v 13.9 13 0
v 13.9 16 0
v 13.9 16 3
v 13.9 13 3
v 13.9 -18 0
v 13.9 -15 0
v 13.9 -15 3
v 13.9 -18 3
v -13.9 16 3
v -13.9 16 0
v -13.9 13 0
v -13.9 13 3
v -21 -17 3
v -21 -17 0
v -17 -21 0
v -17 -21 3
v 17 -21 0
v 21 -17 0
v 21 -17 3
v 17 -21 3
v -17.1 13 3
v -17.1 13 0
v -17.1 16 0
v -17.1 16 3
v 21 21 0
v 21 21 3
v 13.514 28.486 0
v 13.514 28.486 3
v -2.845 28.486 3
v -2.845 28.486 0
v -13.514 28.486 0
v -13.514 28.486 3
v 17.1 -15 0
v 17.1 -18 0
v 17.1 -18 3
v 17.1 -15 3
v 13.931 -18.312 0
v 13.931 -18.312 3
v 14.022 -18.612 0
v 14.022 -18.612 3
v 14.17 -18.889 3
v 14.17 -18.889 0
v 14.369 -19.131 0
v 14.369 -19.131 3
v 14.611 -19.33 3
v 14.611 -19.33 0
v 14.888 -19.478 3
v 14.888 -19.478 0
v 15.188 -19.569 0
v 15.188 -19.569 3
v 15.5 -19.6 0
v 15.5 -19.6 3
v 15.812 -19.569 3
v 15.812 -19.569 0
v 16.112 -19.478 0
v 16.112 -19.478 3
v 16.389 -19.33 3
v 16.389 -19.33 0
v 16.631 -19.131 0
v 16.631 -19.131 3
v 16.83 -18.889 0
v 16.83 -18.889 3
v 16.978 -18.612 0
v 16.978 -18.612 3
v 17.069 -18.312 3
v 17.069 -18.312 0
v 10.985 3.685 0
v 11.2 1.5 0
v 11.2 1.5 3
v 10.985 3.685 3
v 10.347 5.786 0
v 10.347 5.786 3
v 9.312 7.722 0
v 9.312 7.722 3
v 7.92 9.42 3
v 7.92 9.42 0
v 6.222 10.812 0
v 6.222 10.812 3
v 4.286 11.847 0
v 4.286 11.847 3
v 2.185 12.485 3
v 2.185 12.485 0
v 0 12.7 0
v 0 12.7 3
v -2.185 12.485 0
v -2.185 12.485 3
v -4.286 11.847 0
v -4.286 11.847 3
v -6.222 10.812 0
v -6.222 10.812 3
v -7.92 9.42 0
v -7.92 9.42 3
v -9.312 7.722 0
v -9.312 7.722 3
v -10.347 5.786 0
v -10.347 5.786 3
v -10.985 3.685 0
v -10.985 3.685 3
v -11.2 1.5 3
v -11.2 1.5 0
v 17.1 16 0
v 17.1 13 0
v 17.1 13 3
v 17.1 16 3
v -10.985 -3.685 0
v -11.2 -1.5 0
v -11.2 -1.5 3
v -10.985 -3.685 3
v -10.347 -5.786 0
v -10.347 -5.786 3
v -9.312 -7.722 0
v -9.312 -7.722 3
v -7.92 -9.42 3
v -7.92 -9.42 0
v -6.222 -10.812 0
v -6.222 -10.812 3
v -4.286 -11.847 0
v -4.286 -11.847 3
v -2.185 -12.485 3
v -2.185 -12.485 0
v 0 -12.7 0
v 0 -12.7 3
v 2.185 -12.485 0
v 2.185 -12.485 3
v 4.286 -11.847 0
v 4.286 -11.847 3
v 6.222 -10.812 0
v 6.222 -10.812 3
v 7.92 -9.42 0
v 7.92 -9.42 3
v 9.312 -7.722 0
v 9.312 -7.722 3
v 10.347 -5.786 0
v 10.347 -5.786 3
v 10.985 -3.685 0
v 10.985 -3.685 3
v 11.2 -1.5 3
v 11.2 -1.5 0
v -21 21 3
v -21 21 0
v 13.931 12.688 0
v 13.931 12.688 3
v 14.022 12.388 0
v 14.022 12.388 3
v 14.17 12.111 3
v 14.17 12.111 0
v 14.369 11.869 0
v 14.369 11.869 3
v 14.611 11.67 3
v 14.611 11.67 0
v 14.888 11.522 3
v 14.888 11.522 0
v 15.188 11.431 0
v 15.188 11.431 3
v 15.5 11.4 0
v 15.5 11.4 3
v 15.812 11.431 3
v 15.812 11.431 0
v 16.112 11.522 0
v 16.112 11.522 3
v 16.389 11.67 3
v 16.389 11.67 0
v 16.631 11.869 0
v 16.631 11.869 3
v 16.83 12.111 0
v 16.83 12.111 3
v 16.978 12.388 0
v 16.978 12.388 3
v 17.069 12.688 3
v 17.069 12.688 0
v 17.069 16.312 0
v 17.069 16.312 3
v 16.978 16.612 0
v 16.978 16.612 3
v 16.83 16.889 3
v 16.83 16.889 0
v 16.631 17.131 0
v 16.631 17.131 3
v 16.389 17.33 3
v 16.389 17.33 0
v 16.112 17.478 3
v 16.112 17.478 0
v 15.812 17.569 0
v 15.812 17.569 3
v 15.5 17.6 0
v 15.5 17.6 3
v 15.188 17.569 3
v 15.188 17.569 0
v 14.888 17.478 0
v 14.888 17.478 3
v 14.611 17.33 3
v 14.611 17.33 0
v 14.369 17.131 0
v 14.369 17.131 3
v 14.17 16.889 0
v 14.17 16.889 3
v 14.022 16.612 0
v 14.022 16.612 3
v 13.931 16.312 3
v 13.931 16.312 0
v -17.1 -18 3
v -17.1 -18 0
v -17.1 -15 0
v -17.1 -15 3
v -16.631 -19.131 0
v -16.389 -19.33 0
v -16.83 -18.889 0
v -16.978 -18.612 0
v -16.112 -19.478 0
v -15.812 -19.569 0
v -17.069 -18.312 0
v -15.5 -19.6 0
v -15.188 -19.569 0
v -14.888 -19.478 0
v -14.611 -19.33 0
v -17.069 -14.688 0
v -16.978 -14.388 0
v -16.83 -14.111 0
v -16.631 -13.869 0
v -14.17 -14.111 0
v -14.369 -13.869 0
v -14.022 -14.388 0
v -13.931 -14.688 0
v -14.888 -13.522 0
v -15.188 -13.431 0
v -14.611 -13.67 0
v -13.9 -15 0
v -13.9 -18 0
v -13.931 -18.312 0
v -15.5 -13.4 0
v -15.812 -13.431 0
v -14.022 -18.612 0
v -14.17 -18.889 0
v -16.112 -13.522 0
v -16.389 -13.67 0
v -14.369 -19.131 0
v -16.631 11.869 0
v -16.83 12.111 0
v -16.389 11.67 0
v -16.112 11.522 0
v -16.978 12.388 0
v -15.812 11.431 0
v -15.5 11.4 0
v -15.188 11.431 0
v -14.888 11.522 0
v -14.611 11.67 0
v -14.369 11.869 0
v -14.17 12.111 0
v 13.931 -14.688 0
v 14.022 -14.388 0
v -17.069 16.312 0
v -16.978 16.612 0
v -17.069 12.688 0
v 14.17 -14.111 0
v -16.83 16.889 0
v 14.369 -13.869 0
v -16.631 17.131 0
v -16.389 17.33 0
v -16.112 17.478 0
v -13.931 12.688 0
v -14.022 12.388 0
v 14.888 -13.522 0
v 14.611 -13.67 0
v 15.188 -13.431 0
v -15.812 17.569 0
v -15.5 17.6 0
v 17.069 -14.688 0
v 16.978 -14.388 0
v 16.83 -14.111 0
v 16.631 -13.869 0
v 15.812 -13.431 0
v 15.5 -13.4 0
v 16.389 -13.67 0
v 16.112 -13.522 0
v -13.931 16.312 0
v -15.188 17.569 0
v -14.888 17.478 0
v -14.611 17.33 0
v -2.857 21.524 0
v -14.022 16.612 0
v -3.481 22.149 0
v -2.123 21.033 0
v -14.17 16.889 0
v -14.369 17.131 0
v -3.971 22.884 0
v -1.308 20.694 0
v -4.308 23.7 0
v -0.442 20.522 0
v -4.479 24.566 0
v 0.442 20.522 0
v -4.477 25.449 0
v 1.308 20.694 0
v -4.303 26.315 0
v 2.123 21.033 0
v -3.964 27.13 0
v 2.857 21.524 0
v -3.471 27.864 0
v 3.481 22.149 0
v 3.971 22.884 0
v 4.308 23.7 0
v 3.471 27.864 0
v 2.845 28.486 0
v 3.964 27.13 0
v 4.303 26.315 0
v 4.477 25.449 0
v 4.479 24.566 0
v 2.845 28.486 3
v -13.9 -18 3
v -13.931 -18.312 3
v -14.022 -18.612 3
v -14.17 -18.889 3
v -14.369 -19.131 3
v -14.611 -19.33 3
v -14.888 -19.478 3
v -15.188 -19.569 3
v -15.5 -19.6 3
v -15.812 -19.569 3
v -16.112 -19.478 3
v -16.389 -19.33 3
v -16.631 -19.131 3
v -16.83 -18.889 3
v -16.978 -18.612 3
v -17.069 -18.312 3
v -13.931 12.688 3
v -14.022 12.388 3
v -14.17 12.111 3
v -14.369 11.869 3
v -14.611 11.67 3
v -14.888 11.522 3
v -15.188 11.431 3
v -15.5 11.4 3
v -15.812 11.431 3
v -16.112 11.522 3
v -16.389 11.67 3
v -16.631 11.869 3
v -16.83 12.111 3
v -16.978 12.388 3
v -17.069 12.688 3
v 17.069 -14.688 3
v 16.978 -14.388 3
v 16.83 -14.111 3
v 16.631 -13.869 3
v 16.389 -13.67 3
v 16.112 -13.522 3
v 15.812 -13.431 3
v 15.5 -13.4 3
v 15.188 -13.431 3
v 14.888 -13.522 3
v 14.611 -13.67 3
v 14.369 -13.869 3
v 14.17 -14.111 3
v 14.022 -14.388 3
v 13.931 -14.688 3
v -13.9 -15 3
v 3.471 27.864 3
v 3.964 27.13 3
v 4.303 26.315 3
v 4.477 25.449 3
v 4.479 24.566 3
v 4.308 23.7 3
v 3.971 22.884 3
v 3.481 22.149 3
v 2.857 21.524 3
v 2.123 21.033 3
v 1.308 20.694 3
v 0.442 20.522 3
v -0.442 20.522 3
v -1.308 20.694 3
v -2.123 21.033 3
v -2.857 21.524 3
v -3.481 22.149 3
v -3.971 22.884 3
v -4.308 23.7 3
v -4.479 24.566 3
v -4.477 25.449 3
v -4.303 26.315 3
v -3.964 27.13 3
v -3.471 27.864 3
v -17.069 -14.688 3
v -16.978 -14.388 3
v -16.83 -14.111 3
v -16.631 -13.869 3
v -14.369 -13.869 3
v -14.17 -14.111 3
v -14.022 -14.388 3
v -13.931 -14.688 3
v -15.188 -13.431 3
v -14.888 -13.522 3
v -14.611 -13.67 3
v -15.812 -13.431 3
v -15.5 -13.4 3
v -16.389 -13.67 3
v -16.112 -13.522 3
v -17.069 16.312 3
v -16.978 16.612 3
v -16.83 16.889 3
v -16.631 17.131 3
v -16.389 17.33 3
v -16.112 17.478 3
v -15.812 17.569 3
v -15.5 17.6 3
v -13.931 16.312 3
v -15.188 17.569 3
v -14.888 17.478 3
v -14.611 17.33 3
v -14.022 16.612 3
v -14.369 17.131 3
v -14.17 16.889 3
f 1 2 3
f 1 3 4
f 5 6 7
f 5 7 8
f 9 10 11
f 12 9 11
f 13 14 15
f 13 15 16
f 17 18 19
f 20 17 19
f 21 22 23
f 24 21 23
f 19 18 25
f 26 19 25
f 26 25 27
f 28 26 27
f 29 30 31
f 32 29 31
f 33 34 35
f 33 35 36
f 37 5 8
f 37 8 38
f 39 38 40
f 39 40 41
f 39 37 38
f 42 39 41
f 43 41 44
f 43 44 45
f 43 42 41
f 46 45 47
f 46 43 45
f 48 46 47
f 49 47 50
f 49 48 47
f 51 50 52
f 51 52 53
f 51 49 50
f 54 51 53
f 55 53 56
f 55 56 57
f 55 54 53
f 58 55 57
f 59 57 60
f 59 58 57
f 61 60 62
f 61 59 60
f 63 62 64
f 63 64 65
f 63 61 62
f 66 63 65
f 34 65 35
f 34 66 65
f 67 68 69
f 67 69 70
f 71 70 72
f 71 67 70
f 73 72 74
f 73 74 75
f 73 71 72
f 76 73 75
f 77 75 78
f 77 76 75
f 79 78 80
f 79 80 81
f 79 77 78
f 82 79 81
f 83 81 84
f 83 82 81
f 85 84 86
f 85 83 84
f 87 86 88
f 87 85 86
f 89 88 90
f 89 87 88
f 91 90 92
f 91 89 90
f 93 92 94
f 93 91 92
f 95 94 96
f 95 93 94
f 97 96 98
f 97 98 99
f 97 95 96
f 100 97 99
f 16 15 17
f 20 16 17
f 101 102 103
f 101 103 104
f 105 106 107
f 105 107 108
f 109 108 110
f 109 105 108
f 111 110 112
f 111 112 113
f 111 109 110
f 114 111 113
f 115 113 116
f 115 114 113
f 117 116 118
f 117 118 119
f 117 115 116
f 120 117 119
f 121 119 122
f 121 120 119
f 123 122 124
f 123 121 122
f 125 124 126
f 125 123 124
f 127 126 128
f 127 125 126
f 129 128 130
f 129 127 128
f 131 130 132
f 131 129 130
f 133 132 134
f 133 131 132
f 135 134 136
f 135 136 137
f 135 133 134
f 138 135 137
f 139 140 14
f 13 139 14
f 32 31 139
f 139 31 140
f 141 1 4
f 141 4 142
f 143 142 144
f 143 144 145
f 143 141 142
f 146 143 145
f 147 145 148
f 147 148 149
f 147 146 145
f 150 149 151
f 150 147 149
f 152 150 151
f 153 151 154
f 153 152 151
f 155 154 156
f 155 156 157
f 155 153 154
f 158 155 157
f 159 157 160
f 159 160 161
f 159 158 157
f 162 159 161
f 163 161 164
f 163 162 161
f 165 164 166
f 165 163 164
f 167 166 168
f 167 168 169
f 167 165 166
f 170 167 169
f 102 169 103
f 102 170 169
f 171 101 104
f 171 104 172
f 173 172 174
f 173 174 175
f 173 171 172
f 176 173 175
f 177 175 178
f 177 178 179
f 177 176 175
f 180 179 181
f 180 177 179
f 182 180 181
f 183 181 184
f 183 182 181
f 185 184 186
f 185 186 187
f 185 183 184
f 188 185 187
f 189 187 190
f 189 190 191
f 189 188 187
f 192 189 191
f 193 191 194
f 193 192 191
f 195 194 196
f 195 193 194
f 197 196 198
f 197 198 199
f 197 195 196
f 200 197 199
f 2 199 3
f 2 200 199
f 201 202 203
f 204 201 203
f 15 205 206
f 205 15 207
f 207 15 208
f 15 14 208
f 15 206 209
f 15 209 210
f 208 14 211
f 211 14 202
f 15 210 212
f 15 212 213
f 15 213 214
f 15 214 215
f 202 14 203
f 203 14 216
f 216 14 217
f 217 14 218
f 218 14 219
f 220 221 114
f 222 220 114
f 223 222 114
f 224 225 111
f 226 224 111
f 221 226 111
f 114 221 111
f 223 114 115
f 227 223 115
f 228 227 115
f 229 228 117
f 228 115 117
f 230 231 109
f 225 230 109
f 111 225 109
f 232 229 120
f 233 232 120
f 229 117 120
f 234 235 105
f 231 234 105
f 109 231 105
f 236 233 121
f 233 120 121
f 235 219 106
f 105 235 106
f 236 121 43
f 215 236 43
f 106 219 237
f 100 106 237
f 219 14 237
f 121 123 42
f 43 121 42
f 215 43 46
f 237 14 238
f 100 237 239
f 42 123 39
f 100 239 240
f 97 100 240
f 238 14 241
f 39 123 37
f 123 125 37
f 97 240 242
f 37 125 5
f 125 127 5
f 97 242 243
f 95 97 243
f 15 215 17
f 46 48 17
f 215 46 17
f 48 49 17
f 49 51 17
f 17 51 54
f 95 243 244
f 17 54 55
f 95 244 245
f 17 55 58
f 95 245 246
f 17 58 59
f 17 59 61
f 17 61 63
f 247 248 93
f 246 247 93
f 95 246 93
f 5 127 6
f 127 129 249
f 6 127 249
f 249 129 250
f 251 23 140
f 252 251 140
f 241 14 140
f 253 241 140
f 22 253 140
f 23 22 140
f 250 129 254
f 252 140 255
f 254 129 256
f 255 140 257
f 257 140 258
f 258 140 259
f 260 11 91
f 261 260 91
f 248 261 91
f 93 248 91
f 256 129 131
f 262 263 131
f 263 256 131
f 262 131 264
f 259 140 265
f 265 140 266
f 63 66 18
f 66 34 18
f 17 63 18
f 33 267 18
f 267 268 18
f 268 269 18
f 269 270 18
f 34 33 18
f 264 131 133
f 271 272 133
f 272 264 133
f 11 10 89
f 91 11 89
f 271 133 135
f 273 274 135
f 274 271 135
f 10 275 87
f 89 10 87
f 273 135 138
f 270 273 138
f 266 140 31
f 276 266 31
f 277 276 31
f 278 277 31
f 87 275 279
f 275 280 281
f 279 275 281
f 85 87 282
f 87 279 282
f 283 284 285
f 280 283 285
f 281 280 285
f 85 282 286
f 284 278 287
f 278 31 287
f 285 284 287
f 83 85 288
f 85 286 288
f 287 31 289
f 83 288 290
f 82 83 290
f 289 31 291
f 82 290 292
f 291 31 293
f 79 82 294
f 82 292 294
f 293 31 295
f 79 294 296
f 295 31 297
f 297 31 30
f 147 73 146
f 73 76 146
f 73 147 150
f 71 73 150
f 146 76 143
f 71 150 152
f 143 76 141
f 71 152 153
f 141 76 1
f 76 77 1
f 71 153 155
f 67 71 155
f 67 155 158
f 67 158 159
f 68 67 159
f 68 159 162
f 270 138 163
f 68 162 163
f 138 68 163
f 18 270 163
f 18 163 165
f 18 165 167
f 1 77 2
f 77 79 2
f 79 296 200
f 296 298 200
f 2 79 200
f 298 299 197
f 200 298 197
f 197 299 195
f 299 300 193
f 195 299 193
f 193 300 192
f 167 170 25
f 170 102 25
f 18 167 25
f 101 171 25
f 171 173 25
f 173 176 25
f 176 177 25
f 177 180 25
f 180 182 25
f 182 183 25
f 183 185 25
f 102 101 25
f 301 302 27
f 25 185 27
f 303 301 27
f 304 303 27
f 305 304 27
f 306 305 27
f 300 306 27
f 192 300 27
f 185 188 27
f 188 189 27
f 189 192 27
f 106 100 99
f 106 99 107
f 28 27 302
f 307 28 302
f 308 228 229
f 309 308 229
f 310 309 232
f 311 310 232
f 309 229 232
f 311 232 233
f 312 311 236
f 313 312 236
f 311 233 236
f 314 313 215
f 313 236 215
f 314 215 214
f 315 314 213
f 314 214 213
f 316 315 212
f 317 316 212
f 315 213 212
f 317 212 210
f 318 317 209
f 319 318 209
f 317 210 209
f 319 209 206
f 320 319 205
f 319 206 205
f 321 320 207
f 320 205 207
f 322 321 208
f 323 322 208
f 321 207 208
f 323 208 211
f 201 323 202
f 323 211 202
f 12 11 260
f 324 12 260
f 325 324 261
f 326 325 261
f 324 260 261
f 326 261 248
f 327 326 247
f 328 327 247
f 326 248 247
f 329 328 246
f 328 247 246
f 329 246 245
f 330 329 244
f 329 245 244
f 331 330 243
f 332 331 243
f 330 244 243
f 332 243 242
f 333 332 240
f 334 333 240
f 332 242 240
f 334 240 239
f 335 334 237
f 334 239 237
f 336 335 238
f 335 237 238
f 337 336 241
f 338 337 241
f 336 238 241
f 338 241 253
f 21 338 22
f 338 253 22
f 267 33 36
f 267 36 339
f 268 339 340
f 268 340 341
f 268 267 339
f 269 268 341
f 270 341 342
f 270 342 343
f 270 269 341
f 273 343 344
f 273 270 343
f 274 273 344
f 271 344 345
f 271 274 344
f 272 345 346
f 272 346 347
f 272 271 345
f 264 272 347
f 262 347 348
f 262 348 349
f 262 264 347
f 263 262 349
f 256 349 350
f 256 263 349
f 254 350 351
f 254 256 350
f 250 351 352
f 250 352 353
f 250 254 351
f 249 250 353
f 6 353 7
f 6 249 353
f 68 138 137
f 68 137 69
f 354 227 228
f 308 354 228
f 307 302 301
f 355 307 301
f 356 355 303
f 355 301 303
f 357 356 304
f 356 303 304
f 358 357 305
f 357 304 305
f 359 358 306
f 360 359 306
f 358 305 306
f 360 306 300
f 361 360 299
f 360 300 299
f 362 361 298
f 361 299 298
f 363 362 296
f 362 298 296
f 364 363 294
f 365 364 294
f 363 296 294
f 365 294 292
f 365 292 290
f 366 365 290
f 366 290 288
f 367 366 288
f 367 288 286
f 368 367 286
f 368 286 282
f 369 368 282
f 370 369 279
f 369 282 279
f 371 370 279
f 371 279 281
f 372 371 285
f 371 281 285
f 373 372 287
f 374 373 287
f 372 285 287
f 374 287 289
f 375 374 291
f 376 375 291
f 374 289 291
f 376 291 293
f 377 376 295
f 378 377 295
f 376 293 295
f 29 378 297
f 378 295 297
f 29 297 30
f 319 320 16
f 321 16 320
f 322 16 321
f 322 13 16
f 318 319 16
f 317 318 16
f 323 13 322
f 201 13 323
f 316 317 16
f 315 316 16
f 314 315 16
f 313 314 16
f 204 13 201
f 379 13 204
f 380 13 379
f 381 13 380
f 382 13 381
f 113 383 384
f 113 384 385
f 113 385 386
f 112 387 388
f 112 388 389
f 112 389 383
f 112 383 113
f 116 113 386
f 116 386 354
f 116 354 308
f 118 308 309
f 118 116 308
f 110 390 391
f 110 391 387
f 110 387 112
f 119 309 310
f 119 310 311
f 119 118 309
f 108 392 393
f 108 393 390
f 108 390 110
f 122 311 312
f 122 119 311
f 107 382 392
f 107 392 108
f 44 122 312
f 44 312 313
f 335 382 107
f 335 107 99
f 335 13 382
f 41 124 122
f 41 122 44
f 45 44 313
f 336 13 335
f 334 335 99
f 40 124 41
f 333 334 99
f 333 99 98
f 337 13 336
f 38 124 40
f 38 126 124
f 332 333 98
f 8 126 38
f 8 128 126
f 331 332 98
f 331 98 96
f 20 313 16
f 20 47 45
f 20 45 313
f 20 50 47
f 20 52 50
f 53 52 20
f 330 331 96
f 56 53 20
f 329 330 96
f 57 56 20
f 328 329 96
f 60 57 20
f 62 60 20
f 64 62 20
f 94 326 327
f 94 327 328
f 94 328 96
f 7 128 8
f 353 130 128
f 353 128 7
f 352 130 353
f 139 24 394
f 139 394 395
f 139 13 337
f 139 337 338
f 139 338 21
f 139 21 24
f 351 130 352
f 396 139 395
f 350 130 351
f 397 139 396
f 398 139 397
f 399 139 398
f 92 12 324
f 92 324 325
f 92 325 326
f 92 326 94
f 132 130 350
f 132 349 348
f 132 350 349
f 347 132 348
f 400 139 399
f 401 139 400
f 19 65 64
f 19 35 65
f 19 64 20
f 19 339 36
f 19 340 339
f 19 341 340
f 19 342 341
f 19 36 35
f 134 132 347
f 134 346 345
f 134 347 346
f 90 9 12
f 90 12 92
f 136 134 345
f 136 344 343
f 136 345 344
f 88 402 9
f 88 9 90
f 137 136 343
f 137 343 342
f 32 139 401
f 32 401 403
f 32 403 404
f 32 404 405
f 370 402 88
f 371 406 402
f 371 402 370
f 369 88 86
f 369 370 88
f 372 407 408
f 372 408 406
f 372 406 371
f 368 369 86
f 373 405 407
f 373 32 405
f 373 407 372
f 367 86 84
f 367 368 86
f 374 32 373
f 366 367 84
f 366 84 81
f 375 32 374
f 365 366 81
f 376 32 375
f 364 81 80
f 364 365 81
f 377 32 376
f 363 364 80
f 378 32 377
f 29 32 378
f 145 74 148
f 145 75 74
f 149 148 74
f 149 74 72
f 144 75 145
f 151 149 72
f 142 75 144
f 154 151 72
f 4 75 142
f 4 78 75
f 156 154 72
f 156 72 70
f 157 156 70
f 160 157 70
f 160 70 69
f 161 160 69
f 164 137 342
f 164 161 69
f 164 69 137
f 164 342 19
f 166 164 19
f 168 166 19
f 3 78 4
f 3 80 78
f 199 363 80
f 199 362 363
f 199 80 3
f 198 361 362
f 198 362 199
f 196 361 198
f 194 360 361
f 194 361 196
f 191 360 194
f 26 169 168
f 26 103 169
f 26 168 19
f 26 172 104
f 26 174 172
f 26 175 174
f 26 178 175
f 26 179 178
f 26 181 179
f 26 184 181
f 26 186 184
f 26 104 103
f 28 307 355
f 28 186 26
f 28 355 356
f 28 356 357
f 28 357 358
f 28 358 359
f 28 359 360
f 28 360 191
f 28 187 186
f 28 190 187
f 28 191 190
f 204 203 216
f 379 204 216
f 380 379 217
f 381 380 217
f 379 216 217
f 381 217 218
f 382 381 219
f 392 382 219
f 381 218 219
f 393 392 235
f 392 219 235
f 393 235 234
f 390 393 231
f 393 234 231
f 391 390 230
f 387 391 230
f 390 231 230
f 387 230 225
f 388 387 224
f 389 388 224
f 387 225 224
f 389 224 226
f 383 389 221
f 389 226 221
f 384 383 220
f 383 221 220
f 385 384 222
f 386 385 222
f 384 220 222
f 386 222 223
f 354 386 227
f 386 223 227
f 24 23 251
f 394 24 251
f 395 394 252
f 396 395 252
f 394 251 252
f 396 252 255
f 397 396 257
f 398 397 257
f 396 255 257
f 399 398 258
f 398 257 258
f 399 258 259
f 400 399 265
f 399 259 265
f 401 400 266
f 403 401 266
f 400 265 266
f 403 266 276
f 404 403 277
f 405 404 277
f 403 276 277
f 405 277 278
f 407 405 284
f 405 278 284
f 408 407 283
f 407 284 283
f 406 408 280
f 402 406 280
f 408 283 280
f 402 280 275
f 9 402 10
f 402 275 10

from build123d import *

# Parameters (mm, degrees)
BOSS_EXTRUDE1_DEPTH = 3
CHAMFER1_SIZE       = 4


with BuildPart() as part:
    # Sketch1 → Boss-Extrude1 (new body)
    with BuildSketch(Plane.XY):
        with BuildLine():
            Line((-21, -21), (21, -21))
            Line((21, -21), (21, 21))
            Line((21, 21), (13.513592999, 28.486407001))
            Line((13.513592999, 28.486407001), (2.845165412, 28.486407001))
            ThreePointArc((2.845165412, 28.486407001), (0, 20.5), (-2.845165412, 28.486407001))
            Line((-2.845165412, 28.486407001), (-13.513592999, 28.486407001))
            Line((-13.513592999, 28.486407001), (-21, 21))
            Line((-21, 21), (-21, -21))
        make_face()
        with BuildLine():
            Line((-11.2, 1.5), (-11.2, -1.5))
            ThreePointArc((-11.2, -1.5), (0, -12.7), (11.2, -1.5))
            Line((11.2, -1.5), (11.2, 1.5))
            ThreePointArc((11.2, 1.5), (0, 12.7), (-11.2, 1.5))
        make_face(mode=Mode.SUBTRACT)
        with BuildLine():
            Line((-13.9, -15), (-13.9, -18))
            ThreePointArc((-13.9, -18), (-15.5, -19.6), (-17.1, -18))
            Line((-17.1, -18), (-17.1, -15))
            ThreePointArc((-17.1, -15), (-15.5, -13.4), (-13.9, -15))
        make_face(mode=Mode.SUBTRACT)
        with BuildLine():
            Line((-13.9, 16), (-13.9, 13))
            ThreePointArc((-13.9, 13), (-15.5, 11.4), (-17.1, 13))
            Line((-17.1, 13), (-17.1, 16))
            ThreePointArc((-17.1, 16), (-15.5, 17.6), (-13.9, 16))
        make_face(mode=Mode.SUBTRACT)
        with BuildLine():
            Line((13.9, -15), (13.9, -18))
            ThreePointArc((13.9, -18), (15.5, -19.6), (17.1, -18))
            Line((17.1, -18), (17.1, -15))
            ThreePointArc((17.1, -15), (15.5, -13.4), (13.9, -15))
        make_face(mode=Mode.SUBTRACT)
        with BuildLine():
            Line((13.9, 16), (13.9, 13))
            ThreePointArc((13.9, 13), (15.5, 11.4), (17.1, 13))
            Line((17.1, 13), (17.1, 16))
            ThreePointArc((17.1, 16), (15.5, 17.6), (13.9, 16))
        make_face(mode=Mode.SUBTRACT)
    extrude(amount=BOSS_EXTRUDE1_DEPTH)

    # Chamfer1
    chamfer1_edges = [part.edges().sort_by_distance(p)[0] for p in [
        (21, -21, 1.5),
        (-21, -21, 1.5),
    ]]
    chamfer(chamfer1_edges, length=CHAMFER1_SIZE)


solid = part.part
